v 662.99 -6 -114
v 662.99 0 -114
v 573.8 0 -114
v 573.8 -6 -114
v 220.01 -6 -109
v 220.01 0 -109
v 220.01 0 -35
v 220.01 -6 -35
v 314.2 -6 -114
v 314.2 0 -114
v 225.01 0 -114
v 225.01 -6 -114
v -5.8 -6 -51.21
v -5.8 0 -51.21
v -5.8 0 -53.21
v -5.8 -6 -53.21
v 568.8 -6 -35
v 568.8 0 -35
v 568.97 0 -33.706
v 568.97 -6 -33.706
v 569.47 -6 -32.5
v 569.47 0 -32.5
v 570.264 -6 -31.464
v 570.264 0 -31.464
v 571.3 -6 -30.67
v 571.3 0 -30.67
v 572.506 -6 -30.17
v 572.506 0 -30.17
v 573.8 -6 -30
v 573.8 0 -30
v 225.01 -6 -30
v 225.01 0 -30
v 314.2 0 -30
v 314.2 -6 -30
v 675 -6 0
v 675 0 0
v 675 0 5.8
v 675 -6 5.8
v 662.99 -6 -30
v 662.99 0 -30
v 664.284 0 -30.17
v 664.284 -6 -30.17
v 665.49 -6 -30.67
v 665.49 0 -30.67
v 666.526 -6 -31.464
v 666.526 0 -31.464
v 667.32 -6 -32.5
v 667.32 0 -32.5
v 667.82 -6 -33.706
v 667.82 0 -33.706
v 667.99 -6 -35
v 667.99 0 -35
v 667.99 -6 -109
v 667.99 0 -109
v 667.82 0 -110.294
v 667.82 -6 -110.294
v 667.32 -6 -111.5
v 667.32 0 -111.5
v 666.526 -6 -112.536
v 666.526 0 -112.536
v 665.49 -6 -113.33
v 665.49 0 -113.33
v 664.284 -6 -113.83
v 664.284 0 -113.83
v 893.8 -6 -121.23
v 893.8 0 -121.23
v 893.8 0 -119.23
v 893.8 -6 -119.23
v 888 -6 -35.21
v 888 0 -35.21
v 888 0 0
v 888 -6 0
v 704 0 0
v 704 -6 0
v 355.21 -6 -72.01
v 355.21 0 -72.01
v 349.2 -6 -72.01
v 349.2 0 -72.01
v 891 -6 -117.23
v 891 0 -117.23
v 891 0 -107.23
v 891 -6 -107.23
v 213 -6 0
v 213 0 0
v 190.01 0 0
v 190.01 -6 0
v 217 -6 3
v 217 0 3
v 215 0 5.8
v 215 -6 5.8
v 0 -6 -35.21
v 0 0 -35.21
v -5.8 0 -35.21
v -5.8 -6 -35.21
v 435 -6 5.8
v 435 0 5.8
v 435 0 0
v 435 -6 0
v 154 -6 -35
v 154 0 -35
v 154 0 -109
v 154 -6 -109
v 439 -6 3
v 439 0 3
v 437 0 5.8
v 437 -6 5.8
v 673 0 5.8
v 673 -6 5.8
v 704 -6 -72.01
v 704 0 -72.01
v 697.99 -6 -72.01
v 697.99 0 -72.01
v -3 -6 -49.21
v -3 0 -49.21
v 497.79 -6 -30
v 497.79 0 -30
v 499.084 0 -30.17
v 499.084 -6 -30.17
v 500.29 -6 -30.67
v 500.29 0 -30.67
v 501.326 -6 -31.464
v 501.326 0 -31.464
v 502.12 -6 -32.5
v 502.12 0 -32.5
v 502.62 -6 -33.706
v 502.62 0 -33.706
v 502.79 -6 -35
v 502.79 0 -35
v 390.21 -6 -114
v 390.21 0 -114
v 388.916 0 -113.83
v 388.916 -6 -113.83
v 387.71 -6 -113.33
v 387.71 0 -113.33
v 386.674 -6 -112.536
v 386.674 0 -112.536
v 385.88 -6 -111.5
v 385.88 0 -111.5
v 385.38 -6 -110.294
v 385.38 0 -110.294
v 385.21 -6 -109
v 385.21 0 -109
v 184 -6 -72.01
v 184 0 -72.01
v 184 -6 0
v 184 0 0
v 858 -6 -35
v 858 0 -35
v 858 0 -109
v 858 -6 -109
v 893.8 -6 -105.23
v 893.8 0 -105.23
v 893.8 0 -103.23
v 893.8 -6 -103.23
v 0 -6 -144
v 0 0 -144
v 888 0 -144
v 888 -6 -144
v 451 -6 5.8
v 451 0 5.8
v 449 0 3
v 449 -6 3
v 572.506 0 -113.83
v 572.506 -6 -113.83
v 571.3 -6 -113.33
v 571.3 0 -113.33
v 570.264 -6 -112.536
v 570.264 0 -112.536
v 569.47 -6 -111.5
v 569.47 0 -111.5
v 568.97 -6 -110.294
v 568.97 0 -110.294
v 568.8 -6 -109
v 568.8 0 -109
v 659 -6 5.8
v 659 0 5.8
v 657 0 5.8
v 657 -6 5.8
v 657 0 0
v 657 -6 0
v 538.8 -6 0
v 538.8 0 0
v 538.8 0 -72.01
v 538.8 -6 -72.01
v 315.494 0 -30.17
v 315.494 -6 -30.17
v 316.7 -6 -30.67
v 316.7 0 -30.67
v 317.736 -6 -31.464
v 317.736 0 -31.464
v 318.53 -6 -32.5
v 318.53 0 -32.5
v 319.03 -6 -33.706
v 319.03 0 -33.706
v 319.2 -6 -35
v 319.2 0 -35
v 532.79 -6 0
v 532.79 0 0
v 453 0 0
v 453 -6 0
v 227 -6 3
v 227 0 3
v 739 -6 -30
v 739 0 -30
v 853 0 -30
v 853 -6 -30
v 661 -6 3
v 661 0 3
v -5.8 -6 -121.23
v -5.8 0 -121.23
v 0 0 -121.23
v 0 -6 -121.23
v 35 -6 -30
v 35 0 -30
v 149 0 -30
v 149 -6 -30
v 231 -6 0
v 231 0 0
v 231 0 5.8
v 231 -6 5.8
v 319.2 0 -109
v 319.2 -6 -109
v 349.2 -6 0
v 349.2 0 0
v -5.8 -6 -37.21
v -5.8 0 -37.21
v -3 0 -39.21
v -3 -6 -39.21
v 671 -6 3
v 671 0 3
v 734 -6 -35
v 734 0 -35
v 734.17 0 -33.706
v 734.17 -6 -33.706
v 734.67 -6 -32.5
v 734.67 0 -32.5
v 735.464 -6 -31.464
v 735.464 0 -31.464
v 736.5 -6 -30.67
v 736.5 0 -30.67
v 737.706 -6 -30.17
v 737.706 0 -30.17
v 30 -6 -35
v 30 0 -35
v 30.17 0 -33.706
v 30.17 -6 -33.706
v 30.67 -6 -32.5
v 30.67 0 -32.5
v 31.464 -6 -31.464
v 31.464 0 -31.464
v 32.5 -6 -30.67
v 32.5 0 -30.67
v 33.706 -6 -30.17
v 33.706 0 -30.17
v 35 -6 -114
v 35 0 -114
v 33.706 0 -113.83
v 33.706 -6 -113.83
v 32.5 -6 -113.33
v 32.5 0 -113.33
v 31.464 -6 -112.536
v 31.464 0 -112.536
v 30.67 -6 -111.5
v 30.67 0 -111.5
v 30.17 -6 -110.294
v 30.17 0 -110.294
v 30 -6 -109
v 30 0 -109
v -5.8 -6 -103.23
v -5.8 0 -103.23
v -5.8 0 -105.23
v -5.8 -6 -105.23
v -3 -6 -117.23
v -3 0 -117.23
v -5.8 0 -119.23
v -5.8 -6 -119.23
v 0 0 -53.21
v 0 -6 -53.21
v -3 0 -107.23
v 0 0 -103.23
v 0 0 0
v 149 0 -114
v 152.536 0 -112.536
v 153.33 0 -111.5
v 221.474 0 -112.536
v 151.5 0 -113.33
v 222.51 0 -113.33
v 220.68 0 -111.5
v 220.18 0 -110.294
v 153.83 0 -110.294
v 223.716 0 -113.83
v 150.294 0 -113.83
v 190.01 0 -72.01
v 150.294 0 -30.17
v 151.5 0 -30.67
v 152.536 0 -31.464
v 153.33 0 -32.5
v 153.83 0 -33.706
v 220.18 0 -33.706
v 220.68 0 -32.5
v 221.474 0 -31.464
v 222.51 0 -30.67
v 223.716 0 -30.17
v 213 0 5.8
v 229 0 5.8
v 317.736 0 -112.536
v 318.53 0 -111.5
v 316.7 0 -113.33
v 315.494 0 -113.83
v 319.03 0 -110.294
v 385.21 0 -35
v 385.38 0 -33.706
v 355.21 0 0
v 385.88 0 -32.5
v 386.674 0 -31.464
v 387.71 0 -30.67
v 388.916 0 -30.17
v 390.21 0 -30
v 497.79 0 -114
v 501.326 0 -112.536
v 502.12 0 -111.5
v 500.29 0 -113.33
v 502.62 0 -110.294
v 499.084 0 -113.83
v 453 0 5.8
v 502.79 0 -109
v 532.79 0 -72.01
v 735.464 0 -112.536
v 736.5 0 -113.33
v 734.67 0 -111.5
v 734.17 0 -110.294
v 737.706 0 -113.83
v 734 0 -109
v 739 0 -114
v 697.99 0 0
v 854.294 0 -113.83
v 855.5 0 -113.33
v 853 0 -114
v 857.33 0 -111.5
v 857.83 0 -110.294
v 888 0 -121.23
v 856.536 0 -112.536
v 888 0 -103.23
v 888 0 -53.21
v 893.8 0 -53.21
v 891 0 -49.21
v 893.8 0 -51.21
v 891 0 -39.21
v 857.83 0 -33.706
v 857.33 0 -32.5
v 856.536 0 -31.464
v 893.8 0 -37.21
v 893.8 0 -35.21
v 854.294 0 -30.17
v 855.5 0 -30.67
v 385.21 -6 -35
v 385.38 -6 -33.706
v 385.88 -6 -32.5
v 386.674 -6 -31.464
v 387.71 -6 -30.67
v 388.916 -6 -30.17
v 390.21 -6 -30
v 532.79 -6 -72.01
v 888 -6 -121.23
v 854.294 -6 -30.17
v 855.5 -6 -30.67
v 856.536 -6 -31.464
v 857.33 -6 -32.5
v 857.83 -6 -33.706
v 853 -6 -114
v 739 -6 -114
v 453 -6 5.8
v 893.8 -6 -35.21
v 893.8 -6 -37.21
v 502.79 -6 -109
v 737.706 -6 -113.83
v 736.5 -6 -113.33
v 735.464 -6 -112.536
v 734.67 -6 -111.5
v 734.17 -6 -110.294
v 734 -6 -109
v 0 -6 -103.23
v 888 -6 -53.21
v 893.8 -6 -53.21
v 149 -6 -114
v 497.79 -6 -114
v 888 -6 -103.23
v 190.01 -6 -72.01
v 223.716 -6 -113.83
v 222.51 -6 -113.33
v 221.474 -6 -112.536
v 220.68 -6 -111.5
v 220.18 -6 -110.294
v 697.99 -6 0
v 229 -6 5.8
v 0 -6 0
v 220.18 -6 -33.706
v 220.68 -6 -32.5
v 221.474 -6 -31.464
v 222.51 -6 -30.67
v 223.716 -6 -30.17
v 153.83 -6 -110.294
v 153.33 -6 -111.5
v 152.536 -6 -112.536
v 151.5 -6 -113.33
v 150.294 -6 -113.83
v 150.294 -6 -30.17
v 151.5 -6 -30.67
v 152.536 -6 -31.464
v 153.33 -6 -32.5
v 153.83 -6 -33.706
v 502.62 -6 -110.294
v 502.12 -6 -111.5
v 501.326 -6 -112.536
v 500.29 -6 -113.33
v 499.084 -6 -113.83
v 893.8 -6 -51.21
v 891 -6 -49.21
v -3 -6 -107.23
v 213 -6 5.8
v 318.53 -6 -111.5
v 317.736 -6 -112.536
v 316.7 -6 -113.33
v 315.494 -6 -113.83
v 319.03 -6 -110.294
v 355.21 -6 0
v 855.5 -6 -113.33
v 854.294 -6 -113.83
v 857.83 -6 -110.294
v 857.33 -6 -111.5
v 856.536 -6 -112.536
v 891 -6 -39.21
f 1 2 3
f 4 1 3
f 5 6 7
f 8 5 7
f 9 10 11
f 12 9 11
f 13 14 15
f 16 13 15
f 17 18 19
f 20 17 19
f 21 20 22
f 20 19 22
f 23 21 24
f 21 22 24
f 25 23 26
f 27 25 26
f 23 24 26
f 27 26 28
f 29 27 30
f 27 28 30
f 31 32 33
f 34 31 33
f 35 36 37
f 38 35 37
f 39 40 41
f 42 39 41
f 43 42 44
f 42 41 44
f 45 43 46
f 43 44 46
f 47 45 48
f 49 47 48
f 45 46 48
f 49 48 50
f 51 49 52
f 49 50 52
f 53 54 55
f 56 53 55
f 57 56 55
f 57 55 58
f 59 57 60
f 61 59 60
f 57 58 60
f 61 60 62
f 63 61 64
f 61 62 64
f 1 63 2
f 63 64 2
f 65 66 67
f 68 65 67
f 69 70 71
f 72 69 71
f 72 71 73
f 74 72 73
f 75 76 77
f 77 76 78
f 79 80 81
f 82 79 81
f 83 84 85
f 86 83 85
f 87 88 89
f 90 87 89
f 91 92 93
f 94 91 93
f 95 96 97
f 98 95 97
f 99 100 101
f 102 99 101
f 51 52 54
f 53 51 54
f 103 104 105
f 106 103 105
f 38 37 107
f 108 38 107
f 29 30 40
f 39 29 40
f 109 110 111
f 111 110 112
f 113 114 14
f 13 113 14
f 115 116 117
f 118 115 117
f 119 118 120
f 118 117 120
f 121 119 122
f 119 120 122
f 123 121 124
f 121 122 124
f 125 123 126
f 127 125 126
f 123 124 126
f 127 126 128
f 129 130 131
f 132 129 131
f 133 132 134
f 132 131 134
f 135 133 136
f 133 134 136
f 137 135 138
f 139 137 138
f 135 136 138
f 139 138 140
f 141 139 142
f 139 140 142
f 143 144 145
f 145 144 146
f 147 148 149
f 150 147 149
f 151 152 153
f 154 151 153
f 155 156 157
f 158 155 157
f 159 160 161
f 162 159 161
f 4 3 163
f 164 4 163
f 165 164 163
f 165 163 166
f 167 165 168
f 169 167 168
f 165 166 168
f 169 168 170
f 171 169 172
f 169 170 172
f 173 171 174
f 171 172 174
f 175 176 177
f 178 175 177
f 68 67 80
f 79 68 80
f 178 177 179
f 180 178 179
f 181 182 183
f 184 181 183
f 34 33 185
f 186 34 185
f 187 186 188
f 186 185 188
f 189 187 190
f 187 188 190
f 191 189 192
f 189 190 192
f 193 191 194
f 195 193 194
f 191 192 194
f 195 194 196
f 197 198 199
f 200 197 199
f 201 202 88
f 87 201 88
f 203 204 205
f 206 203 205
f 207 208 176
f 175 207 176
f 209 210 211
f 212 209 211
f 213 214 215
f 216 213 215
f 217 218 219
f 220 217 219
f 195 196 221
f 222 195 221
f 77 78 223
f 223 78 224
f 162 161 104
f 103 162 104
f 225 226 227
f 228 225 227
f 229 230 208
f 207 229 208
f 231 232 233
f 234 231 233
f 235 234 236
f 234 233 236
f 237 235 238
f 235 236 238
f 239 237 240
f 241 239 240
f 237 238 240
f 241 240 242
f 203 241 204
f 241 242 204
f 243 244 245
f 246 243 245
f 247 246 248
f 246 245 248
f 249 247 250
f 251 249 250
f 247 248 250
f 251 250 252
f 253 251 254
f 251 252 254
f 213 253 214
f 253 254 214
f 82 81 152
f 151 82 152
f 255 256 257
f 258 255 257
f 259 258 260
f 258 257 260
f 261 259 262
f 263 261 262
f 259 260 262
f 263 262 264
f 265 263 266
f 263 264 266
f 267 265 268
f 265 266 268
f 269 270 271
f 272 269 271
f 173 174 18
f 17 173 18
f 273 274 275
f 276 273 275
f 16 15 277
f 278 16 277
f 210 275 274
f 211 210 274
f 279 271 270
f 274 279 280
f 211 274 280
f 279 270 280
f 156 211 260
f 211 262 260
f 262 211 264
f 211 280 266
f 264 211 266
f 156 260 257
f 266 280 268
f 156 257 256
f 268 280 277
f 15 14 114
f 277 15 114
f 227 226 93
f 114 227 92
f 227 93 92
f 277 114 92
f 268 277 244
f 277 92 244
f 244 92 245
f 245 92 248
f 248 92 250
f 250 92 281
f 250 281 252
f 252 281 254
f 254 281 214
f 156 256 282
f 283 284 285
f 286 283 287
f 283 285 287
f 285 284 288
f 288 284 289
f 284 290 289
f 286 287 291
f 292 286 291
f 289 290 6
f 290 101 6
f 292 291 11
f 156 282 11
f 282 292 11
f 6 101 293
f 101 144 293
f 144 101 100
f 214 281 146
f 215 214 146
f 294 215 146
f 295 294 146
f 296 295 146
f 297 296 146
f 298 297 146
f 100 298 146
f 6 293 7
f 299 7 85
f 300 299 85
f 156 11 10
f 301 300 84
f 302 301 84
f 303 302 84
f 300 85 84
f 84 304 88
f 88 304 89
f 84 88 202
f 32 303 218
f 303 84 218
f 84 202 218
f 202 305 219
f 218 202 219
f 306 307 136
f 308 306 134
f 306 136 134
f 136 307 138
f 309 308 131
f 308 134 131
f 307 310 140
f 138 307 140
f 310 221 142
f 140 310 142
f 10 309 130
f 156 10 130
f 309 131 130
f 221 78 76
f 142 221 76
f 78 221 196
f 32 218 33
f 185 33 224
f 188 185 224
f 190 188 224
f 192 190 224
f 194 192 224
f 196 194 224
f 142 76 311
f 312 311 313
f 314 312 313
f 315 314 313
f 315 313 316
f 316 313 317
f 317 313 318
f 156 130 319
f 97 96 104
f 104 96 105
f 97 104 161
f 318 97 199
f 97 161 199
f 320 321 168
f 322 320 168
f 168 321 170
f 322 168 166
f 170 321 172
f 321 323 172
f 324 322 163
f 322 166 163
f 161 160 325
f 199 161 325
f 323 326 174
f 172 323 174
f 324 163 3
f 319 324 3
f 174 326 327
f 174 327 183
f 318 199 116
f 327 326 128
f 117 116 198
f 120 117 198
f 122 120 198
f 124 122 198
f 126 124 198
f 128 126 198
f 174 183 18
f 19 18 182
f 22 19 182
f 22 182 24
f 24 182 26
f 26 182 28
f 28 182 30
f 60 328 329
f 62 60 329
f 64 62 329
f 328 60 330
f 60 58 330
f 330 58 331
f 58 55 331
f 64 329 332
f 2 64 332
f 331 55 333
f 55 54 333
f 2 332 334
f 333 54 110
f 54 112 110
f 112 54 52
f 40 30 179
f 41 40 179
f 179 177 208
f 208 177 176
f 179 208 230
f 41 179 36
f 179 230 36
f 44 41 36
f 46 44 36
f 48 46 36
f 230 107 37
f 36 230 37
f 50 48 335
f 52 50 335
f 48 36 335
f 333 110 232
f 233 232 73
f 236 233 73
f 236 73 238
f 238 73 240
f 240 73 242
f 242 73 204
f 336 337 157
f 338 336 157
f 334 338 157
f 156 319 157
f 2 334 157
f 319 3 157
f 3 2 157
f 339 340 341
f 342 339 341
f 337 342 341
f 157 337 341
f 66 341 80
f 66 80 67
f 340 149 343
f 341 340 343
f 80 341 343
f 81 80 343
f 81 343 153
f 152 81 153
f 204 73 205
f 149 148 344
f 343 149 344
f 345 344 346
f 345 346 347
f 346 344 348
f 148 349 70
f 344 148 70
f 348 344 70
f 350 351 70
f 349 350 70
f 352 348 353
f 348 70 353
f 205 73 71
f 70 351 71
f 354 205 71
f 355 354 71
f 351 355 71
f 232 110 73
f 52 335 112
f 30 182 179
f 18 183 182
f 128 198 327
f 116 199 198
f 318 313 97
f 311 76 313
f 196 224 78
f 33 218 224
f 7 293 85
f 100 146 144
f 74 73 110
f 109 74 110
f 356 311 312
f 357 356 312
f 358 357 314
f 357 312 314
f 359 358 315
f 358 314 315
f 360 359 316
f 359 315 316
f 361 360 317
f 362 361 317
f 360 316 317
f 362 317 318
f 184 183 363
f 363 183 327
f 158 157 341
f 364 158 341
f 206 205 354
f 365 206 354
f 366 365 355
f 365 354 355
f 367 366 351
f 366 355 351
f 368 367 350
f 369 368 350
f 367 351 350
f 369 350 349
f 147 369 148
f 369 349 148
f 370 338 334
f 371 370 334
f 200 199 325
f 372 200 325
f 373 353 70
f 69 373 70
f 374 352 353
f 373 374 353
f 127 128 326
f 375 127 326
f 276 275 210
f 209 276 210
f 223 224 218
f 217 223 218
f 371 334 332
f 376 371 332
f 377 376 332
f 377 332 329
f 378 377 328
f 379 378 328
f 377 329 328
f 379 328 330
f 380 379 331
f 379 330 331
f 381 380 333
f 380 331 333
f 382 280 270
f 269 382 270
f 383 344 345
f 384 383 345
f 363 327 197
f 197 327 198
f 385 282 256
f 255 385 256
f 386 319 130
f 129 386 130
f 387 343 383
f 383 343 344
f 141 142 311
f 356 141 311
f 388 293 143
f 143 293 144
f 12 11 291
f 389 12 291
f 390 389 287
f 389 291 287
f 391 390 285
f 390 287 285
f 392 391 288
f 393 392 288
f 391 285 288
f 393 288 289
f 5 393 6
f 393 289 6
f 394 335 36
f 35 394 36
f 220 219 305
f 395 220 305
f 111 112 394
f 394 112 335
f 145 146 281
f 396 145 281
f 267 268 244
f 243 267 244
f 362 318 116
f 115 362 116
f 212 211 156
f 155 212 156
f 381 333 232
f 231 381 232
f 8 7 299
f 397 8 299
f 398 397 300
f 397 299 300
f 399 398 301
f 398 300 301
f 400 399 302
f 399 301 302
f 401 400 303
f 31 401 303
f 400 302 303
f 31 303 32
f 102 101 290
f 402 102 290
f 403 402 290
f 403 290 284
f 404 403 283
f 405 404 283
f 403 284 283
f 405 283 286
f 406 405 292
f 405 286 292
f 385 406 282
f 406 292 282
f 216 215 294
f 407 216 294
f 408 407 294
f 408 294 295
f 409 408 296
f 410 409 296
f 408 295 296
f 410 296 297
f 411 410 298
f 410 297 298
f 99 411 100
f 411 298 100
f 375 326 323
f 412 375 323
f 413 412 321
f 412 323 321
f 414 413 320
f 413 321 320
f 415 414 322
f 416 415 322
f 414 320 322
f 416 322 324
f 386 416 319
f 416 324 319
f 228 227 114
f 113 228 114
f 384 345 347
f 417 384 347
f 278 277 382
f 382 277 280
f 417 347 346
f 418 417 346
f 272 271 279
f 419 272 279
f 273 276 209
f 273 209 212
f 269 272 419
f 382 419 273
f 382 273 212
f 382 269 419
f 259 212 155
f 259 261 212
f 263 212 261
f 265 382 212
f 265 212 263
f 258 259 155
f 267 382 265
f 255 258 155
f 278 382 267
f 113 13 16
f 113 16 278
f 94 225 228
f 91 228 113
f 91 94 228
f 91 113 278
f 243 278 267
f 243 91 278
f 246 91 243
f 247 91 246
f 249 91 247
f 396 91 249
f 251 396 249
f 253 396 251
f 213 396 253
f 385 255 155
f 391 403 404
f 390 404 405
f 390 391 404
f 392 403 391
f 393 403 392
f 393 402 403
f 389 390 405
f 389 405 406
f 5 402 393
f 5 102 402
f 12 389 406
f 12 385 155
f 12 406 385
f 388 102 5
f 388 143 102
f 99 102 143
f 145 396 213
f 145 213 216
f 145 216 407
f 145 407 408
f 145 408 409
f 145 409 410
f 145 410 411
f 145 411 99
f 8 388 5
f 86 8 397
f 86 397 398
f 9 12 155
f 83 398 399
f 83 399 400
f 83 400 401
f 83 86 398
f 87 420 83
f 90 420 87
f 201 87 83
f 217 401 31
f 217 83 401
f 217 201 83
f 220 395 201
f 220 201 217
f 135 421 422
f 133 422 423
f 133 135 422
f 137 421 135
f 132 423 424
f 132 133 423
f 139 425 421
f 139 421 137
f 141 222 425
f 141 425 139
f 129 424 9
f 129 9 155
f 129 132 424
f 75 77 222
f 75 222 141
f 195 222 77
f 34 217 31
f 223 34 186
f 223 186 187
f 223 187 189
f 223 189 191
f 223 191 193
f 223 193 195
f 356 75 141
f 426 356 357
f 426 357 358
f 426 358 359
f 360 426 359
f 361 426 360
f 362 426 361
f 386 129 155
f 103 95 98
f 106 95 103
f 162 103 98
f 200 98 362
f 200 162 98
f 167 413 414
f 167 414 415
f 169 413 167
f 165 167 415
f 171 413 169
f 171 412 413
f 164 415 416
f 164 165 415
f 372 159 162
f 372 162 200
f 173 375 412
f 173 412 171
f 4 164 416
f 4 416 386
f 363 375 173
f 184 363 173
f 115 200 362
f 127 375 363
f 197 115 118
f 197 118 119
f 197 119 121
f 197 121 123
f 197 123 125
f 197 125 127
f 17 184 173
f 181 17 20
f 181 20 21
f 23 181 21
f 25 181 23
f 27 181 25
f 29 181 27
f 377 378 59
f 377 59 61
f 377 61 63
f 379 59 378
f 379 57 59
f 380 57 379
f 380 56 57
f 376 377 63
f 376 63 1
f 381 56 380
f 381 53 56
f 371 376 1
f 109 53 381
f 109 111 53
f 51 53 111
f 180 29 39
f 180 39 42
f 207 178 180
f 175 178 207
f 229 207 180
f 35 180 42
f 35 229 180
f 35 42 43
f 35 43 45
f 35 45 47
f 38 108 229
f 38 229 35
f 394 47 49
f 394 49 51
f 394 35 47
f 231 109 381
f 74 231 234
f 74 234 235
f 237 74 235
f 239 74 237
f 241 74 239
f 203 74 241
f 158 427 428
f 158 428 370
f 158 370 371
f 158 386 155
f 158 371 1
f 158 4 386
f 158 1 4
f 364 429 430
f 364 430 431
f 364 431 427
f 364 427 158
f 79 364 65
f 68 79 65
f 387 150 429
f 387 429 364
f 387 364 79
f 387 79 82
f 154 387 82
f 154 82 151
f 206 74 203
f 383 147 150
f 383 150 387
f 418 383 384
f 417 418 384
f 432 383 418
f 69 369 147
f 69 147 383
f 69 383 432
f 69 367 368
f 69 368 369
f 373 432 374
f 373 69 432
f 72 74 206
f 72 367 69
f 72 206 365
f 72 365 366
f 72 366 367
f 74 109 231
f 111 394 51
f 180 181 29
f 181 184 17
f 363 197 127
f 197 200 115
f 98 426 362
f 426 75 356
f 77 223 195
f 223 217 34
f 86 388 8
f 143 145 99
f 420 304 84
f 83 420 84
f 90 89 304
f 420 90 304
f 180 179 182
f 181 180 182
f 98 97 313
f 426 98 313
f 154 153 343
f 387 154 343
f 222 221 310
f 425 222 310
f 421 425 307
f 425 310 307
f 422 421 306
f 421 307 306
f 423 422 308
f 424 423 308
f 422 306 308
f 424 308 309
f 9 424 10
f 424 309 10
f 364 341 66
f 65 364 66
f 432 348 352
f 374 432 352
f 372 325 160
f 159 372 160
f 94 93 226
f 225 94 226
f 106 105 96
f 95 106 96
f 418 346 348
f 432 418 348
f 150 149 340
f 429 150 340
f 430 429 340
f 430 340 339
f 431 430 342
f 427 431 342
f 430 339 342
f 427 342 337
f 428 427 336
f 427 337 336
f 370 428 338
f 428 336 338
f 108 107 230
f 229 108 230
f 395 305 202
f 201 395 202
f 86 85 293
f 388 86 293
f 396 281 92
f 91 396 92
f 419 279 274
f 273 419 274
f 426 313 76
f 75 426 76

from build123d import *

# Parameters (mm, degrees)
F1_DEPTH = 6


with BuildPart() as f1:
    # F0 (on Front) → F1 (new body)
    with BuildSketch(Plane.XZ):
        Polygon((184, 0), (0, 0), (0, -35.21), (-5.8, -35.21), (-5.8, -37.21), (-3, -39.21), (-3, -49.21), (-5.8, -51.21), (-5.8, -53.21), (0, -53.21), (0, -103.23), (-5.8, -103.23), (-5.8, -105.23), (-3, -107.23), (-3, -117.23), (-5.8, -119.23), (-5.8, -121.23), (0, -121.23), (0, -144), (888, -144), (888, -121.23), (893.8, -121.23), (893.8, -119.23), (891, -117.23), (891, -107.23), (893.8, -105.23), (893.8, -103.23), (888, -103.23), (888, -53.21), (893.8, -53.21), (893.8, -51.21), (891, -49.21), (891, -39.21), (893.8, -37.21), (893.8, -35.21), (888, -35.21), (888, 0), (704, 0), (704, -72.01), (697.99, -72.01), (697.99, 0), (675, 0), (675, 5.8), (673, 5.8), (671, 3), (661, 3), (659, 5.8), (657, 5.8), (657, 0), (538.8, 0), (538.8, -72.01), (532.79, -72.01), (532.79, 0), (453, 0), (453, 5.8), (451, 5.8), (449, 3), (439, 3), (437, 5.8), (435, 5.8), (435, 0), (355.21, 0), (355.21, -72.01), (349.2, -72.01), (349.2, 0), (231, 0), (231, 5.8), (229, 5.8), (227, 3), (217, 3), (215, 5.8), (213, 5.8), (213, 0), (190.01, 0), (190.01, -72.01), (184, -72.01), align=None)
        with BuildLine():
            ThreePointArc((30, -35), (31.464466, -31.464466), (35, -30))
            Line((35, -30), (149, -30))
            ThreePointArc((149, -30), (152.535534, -31.464466), (154, -35))
            Line((154, -35), (154, -109))
            ThreePointArc((154, -109), (152.535534, -112.535534), (149, -114))
            Line((149, -114), (35, -114))
            ThreePointArc((35, -114), (31.464466, -112.535534), (30, -109))
            Line((30, -109), (30, -35))
        make_face(mode=Mode.SUBTRACT)
        with BuildLine():
            Line((220.01, -109), (220.01, -35))
            ThreePointArc((220.01, -35), (221.474466, -31.464466), (225.01, -30))
            Line((225.01, -30), (314.2, -30))
            ThreePointArc((314.2, -30), (317.735534, -31.464466), (319.2, -35))
            Line((319.2, -35), (319.2, -109))
            ThreePointArc((319.2, -109), (317.735534, -112.535534), (314.2, -114))
            Line((314.2, -114), (225.01, -114))
            ThreePointArc((225.01, -114), (221.474466, -112.535534), (220.01, -109))
        make_face(mode=Mode.SUBTRACT)
        with BuildLine():
            ThreePointArc((385.21, -35), (386.674466, -31.464466), (390.21, -30))
            Line((390.21, -30), (497.79, -30))
            ThreePointArc((497.79, -30), (501.325534, -31.464466), (502.79, -35))
            Line((502.79, -35), (502.79, -109))
            ThreePointArc((502.79, -109), (501.325534, -112.535534), (497.79, -114))
            Line((497.79, -114), (390.21, -114))
            ThreePointArc((390.21, -114), (386.674466, -112.535534), (385.21, -109))
            Line((385.21, -109), (385.21, -35))
        make_face(mode=Mode.SUBTRACT)
        with BuildLine():
            ThreePointArc((568.8, -35), (570.264466, -31.464466), (573.8, -30))
            Line((573.8, -30), (662.99, -30))
            ThreePointArc((662.99, -30), (666.525534, -31.464466), (667.99, -35))
            Line((667.99, -35), (667.99, -109))
            ThreePointArc((667.99, -109), (666.525534, -112.535534), (662.99, -114))
            Line((662.99, -114), (573.8, -114))
            ThreePointArc((573.8, -114), (570.264466, -112.535534), (568.8, -109))
            Line((568.8, -109), (568.8, -35))
        make_face(mode=Mode.SUBTRACT)
        with BuildLine():
            ThreePointArc((734, -35), (735.464466, -31.464466), (739, -30))
            Line((739, -30), (853, -30))
            ThreePointArc((853, -30), (856.535534, -31.464466), (858, -35))
            Line((858, -35), (858, -109))
            ThreePointArc((858, -109), (856.535534, -112.535534), (853, -114))
            Line((853, -114), (739, -114))
            ThreePointArc((739, -114), (735.464466, -112.535534), (734, -109))
            Line((734, -109), (734, -35))
        make_face(mode=Mode.SUBTRACT)
    extrude(amount=F1_DEPTH)


solid = f1.part
